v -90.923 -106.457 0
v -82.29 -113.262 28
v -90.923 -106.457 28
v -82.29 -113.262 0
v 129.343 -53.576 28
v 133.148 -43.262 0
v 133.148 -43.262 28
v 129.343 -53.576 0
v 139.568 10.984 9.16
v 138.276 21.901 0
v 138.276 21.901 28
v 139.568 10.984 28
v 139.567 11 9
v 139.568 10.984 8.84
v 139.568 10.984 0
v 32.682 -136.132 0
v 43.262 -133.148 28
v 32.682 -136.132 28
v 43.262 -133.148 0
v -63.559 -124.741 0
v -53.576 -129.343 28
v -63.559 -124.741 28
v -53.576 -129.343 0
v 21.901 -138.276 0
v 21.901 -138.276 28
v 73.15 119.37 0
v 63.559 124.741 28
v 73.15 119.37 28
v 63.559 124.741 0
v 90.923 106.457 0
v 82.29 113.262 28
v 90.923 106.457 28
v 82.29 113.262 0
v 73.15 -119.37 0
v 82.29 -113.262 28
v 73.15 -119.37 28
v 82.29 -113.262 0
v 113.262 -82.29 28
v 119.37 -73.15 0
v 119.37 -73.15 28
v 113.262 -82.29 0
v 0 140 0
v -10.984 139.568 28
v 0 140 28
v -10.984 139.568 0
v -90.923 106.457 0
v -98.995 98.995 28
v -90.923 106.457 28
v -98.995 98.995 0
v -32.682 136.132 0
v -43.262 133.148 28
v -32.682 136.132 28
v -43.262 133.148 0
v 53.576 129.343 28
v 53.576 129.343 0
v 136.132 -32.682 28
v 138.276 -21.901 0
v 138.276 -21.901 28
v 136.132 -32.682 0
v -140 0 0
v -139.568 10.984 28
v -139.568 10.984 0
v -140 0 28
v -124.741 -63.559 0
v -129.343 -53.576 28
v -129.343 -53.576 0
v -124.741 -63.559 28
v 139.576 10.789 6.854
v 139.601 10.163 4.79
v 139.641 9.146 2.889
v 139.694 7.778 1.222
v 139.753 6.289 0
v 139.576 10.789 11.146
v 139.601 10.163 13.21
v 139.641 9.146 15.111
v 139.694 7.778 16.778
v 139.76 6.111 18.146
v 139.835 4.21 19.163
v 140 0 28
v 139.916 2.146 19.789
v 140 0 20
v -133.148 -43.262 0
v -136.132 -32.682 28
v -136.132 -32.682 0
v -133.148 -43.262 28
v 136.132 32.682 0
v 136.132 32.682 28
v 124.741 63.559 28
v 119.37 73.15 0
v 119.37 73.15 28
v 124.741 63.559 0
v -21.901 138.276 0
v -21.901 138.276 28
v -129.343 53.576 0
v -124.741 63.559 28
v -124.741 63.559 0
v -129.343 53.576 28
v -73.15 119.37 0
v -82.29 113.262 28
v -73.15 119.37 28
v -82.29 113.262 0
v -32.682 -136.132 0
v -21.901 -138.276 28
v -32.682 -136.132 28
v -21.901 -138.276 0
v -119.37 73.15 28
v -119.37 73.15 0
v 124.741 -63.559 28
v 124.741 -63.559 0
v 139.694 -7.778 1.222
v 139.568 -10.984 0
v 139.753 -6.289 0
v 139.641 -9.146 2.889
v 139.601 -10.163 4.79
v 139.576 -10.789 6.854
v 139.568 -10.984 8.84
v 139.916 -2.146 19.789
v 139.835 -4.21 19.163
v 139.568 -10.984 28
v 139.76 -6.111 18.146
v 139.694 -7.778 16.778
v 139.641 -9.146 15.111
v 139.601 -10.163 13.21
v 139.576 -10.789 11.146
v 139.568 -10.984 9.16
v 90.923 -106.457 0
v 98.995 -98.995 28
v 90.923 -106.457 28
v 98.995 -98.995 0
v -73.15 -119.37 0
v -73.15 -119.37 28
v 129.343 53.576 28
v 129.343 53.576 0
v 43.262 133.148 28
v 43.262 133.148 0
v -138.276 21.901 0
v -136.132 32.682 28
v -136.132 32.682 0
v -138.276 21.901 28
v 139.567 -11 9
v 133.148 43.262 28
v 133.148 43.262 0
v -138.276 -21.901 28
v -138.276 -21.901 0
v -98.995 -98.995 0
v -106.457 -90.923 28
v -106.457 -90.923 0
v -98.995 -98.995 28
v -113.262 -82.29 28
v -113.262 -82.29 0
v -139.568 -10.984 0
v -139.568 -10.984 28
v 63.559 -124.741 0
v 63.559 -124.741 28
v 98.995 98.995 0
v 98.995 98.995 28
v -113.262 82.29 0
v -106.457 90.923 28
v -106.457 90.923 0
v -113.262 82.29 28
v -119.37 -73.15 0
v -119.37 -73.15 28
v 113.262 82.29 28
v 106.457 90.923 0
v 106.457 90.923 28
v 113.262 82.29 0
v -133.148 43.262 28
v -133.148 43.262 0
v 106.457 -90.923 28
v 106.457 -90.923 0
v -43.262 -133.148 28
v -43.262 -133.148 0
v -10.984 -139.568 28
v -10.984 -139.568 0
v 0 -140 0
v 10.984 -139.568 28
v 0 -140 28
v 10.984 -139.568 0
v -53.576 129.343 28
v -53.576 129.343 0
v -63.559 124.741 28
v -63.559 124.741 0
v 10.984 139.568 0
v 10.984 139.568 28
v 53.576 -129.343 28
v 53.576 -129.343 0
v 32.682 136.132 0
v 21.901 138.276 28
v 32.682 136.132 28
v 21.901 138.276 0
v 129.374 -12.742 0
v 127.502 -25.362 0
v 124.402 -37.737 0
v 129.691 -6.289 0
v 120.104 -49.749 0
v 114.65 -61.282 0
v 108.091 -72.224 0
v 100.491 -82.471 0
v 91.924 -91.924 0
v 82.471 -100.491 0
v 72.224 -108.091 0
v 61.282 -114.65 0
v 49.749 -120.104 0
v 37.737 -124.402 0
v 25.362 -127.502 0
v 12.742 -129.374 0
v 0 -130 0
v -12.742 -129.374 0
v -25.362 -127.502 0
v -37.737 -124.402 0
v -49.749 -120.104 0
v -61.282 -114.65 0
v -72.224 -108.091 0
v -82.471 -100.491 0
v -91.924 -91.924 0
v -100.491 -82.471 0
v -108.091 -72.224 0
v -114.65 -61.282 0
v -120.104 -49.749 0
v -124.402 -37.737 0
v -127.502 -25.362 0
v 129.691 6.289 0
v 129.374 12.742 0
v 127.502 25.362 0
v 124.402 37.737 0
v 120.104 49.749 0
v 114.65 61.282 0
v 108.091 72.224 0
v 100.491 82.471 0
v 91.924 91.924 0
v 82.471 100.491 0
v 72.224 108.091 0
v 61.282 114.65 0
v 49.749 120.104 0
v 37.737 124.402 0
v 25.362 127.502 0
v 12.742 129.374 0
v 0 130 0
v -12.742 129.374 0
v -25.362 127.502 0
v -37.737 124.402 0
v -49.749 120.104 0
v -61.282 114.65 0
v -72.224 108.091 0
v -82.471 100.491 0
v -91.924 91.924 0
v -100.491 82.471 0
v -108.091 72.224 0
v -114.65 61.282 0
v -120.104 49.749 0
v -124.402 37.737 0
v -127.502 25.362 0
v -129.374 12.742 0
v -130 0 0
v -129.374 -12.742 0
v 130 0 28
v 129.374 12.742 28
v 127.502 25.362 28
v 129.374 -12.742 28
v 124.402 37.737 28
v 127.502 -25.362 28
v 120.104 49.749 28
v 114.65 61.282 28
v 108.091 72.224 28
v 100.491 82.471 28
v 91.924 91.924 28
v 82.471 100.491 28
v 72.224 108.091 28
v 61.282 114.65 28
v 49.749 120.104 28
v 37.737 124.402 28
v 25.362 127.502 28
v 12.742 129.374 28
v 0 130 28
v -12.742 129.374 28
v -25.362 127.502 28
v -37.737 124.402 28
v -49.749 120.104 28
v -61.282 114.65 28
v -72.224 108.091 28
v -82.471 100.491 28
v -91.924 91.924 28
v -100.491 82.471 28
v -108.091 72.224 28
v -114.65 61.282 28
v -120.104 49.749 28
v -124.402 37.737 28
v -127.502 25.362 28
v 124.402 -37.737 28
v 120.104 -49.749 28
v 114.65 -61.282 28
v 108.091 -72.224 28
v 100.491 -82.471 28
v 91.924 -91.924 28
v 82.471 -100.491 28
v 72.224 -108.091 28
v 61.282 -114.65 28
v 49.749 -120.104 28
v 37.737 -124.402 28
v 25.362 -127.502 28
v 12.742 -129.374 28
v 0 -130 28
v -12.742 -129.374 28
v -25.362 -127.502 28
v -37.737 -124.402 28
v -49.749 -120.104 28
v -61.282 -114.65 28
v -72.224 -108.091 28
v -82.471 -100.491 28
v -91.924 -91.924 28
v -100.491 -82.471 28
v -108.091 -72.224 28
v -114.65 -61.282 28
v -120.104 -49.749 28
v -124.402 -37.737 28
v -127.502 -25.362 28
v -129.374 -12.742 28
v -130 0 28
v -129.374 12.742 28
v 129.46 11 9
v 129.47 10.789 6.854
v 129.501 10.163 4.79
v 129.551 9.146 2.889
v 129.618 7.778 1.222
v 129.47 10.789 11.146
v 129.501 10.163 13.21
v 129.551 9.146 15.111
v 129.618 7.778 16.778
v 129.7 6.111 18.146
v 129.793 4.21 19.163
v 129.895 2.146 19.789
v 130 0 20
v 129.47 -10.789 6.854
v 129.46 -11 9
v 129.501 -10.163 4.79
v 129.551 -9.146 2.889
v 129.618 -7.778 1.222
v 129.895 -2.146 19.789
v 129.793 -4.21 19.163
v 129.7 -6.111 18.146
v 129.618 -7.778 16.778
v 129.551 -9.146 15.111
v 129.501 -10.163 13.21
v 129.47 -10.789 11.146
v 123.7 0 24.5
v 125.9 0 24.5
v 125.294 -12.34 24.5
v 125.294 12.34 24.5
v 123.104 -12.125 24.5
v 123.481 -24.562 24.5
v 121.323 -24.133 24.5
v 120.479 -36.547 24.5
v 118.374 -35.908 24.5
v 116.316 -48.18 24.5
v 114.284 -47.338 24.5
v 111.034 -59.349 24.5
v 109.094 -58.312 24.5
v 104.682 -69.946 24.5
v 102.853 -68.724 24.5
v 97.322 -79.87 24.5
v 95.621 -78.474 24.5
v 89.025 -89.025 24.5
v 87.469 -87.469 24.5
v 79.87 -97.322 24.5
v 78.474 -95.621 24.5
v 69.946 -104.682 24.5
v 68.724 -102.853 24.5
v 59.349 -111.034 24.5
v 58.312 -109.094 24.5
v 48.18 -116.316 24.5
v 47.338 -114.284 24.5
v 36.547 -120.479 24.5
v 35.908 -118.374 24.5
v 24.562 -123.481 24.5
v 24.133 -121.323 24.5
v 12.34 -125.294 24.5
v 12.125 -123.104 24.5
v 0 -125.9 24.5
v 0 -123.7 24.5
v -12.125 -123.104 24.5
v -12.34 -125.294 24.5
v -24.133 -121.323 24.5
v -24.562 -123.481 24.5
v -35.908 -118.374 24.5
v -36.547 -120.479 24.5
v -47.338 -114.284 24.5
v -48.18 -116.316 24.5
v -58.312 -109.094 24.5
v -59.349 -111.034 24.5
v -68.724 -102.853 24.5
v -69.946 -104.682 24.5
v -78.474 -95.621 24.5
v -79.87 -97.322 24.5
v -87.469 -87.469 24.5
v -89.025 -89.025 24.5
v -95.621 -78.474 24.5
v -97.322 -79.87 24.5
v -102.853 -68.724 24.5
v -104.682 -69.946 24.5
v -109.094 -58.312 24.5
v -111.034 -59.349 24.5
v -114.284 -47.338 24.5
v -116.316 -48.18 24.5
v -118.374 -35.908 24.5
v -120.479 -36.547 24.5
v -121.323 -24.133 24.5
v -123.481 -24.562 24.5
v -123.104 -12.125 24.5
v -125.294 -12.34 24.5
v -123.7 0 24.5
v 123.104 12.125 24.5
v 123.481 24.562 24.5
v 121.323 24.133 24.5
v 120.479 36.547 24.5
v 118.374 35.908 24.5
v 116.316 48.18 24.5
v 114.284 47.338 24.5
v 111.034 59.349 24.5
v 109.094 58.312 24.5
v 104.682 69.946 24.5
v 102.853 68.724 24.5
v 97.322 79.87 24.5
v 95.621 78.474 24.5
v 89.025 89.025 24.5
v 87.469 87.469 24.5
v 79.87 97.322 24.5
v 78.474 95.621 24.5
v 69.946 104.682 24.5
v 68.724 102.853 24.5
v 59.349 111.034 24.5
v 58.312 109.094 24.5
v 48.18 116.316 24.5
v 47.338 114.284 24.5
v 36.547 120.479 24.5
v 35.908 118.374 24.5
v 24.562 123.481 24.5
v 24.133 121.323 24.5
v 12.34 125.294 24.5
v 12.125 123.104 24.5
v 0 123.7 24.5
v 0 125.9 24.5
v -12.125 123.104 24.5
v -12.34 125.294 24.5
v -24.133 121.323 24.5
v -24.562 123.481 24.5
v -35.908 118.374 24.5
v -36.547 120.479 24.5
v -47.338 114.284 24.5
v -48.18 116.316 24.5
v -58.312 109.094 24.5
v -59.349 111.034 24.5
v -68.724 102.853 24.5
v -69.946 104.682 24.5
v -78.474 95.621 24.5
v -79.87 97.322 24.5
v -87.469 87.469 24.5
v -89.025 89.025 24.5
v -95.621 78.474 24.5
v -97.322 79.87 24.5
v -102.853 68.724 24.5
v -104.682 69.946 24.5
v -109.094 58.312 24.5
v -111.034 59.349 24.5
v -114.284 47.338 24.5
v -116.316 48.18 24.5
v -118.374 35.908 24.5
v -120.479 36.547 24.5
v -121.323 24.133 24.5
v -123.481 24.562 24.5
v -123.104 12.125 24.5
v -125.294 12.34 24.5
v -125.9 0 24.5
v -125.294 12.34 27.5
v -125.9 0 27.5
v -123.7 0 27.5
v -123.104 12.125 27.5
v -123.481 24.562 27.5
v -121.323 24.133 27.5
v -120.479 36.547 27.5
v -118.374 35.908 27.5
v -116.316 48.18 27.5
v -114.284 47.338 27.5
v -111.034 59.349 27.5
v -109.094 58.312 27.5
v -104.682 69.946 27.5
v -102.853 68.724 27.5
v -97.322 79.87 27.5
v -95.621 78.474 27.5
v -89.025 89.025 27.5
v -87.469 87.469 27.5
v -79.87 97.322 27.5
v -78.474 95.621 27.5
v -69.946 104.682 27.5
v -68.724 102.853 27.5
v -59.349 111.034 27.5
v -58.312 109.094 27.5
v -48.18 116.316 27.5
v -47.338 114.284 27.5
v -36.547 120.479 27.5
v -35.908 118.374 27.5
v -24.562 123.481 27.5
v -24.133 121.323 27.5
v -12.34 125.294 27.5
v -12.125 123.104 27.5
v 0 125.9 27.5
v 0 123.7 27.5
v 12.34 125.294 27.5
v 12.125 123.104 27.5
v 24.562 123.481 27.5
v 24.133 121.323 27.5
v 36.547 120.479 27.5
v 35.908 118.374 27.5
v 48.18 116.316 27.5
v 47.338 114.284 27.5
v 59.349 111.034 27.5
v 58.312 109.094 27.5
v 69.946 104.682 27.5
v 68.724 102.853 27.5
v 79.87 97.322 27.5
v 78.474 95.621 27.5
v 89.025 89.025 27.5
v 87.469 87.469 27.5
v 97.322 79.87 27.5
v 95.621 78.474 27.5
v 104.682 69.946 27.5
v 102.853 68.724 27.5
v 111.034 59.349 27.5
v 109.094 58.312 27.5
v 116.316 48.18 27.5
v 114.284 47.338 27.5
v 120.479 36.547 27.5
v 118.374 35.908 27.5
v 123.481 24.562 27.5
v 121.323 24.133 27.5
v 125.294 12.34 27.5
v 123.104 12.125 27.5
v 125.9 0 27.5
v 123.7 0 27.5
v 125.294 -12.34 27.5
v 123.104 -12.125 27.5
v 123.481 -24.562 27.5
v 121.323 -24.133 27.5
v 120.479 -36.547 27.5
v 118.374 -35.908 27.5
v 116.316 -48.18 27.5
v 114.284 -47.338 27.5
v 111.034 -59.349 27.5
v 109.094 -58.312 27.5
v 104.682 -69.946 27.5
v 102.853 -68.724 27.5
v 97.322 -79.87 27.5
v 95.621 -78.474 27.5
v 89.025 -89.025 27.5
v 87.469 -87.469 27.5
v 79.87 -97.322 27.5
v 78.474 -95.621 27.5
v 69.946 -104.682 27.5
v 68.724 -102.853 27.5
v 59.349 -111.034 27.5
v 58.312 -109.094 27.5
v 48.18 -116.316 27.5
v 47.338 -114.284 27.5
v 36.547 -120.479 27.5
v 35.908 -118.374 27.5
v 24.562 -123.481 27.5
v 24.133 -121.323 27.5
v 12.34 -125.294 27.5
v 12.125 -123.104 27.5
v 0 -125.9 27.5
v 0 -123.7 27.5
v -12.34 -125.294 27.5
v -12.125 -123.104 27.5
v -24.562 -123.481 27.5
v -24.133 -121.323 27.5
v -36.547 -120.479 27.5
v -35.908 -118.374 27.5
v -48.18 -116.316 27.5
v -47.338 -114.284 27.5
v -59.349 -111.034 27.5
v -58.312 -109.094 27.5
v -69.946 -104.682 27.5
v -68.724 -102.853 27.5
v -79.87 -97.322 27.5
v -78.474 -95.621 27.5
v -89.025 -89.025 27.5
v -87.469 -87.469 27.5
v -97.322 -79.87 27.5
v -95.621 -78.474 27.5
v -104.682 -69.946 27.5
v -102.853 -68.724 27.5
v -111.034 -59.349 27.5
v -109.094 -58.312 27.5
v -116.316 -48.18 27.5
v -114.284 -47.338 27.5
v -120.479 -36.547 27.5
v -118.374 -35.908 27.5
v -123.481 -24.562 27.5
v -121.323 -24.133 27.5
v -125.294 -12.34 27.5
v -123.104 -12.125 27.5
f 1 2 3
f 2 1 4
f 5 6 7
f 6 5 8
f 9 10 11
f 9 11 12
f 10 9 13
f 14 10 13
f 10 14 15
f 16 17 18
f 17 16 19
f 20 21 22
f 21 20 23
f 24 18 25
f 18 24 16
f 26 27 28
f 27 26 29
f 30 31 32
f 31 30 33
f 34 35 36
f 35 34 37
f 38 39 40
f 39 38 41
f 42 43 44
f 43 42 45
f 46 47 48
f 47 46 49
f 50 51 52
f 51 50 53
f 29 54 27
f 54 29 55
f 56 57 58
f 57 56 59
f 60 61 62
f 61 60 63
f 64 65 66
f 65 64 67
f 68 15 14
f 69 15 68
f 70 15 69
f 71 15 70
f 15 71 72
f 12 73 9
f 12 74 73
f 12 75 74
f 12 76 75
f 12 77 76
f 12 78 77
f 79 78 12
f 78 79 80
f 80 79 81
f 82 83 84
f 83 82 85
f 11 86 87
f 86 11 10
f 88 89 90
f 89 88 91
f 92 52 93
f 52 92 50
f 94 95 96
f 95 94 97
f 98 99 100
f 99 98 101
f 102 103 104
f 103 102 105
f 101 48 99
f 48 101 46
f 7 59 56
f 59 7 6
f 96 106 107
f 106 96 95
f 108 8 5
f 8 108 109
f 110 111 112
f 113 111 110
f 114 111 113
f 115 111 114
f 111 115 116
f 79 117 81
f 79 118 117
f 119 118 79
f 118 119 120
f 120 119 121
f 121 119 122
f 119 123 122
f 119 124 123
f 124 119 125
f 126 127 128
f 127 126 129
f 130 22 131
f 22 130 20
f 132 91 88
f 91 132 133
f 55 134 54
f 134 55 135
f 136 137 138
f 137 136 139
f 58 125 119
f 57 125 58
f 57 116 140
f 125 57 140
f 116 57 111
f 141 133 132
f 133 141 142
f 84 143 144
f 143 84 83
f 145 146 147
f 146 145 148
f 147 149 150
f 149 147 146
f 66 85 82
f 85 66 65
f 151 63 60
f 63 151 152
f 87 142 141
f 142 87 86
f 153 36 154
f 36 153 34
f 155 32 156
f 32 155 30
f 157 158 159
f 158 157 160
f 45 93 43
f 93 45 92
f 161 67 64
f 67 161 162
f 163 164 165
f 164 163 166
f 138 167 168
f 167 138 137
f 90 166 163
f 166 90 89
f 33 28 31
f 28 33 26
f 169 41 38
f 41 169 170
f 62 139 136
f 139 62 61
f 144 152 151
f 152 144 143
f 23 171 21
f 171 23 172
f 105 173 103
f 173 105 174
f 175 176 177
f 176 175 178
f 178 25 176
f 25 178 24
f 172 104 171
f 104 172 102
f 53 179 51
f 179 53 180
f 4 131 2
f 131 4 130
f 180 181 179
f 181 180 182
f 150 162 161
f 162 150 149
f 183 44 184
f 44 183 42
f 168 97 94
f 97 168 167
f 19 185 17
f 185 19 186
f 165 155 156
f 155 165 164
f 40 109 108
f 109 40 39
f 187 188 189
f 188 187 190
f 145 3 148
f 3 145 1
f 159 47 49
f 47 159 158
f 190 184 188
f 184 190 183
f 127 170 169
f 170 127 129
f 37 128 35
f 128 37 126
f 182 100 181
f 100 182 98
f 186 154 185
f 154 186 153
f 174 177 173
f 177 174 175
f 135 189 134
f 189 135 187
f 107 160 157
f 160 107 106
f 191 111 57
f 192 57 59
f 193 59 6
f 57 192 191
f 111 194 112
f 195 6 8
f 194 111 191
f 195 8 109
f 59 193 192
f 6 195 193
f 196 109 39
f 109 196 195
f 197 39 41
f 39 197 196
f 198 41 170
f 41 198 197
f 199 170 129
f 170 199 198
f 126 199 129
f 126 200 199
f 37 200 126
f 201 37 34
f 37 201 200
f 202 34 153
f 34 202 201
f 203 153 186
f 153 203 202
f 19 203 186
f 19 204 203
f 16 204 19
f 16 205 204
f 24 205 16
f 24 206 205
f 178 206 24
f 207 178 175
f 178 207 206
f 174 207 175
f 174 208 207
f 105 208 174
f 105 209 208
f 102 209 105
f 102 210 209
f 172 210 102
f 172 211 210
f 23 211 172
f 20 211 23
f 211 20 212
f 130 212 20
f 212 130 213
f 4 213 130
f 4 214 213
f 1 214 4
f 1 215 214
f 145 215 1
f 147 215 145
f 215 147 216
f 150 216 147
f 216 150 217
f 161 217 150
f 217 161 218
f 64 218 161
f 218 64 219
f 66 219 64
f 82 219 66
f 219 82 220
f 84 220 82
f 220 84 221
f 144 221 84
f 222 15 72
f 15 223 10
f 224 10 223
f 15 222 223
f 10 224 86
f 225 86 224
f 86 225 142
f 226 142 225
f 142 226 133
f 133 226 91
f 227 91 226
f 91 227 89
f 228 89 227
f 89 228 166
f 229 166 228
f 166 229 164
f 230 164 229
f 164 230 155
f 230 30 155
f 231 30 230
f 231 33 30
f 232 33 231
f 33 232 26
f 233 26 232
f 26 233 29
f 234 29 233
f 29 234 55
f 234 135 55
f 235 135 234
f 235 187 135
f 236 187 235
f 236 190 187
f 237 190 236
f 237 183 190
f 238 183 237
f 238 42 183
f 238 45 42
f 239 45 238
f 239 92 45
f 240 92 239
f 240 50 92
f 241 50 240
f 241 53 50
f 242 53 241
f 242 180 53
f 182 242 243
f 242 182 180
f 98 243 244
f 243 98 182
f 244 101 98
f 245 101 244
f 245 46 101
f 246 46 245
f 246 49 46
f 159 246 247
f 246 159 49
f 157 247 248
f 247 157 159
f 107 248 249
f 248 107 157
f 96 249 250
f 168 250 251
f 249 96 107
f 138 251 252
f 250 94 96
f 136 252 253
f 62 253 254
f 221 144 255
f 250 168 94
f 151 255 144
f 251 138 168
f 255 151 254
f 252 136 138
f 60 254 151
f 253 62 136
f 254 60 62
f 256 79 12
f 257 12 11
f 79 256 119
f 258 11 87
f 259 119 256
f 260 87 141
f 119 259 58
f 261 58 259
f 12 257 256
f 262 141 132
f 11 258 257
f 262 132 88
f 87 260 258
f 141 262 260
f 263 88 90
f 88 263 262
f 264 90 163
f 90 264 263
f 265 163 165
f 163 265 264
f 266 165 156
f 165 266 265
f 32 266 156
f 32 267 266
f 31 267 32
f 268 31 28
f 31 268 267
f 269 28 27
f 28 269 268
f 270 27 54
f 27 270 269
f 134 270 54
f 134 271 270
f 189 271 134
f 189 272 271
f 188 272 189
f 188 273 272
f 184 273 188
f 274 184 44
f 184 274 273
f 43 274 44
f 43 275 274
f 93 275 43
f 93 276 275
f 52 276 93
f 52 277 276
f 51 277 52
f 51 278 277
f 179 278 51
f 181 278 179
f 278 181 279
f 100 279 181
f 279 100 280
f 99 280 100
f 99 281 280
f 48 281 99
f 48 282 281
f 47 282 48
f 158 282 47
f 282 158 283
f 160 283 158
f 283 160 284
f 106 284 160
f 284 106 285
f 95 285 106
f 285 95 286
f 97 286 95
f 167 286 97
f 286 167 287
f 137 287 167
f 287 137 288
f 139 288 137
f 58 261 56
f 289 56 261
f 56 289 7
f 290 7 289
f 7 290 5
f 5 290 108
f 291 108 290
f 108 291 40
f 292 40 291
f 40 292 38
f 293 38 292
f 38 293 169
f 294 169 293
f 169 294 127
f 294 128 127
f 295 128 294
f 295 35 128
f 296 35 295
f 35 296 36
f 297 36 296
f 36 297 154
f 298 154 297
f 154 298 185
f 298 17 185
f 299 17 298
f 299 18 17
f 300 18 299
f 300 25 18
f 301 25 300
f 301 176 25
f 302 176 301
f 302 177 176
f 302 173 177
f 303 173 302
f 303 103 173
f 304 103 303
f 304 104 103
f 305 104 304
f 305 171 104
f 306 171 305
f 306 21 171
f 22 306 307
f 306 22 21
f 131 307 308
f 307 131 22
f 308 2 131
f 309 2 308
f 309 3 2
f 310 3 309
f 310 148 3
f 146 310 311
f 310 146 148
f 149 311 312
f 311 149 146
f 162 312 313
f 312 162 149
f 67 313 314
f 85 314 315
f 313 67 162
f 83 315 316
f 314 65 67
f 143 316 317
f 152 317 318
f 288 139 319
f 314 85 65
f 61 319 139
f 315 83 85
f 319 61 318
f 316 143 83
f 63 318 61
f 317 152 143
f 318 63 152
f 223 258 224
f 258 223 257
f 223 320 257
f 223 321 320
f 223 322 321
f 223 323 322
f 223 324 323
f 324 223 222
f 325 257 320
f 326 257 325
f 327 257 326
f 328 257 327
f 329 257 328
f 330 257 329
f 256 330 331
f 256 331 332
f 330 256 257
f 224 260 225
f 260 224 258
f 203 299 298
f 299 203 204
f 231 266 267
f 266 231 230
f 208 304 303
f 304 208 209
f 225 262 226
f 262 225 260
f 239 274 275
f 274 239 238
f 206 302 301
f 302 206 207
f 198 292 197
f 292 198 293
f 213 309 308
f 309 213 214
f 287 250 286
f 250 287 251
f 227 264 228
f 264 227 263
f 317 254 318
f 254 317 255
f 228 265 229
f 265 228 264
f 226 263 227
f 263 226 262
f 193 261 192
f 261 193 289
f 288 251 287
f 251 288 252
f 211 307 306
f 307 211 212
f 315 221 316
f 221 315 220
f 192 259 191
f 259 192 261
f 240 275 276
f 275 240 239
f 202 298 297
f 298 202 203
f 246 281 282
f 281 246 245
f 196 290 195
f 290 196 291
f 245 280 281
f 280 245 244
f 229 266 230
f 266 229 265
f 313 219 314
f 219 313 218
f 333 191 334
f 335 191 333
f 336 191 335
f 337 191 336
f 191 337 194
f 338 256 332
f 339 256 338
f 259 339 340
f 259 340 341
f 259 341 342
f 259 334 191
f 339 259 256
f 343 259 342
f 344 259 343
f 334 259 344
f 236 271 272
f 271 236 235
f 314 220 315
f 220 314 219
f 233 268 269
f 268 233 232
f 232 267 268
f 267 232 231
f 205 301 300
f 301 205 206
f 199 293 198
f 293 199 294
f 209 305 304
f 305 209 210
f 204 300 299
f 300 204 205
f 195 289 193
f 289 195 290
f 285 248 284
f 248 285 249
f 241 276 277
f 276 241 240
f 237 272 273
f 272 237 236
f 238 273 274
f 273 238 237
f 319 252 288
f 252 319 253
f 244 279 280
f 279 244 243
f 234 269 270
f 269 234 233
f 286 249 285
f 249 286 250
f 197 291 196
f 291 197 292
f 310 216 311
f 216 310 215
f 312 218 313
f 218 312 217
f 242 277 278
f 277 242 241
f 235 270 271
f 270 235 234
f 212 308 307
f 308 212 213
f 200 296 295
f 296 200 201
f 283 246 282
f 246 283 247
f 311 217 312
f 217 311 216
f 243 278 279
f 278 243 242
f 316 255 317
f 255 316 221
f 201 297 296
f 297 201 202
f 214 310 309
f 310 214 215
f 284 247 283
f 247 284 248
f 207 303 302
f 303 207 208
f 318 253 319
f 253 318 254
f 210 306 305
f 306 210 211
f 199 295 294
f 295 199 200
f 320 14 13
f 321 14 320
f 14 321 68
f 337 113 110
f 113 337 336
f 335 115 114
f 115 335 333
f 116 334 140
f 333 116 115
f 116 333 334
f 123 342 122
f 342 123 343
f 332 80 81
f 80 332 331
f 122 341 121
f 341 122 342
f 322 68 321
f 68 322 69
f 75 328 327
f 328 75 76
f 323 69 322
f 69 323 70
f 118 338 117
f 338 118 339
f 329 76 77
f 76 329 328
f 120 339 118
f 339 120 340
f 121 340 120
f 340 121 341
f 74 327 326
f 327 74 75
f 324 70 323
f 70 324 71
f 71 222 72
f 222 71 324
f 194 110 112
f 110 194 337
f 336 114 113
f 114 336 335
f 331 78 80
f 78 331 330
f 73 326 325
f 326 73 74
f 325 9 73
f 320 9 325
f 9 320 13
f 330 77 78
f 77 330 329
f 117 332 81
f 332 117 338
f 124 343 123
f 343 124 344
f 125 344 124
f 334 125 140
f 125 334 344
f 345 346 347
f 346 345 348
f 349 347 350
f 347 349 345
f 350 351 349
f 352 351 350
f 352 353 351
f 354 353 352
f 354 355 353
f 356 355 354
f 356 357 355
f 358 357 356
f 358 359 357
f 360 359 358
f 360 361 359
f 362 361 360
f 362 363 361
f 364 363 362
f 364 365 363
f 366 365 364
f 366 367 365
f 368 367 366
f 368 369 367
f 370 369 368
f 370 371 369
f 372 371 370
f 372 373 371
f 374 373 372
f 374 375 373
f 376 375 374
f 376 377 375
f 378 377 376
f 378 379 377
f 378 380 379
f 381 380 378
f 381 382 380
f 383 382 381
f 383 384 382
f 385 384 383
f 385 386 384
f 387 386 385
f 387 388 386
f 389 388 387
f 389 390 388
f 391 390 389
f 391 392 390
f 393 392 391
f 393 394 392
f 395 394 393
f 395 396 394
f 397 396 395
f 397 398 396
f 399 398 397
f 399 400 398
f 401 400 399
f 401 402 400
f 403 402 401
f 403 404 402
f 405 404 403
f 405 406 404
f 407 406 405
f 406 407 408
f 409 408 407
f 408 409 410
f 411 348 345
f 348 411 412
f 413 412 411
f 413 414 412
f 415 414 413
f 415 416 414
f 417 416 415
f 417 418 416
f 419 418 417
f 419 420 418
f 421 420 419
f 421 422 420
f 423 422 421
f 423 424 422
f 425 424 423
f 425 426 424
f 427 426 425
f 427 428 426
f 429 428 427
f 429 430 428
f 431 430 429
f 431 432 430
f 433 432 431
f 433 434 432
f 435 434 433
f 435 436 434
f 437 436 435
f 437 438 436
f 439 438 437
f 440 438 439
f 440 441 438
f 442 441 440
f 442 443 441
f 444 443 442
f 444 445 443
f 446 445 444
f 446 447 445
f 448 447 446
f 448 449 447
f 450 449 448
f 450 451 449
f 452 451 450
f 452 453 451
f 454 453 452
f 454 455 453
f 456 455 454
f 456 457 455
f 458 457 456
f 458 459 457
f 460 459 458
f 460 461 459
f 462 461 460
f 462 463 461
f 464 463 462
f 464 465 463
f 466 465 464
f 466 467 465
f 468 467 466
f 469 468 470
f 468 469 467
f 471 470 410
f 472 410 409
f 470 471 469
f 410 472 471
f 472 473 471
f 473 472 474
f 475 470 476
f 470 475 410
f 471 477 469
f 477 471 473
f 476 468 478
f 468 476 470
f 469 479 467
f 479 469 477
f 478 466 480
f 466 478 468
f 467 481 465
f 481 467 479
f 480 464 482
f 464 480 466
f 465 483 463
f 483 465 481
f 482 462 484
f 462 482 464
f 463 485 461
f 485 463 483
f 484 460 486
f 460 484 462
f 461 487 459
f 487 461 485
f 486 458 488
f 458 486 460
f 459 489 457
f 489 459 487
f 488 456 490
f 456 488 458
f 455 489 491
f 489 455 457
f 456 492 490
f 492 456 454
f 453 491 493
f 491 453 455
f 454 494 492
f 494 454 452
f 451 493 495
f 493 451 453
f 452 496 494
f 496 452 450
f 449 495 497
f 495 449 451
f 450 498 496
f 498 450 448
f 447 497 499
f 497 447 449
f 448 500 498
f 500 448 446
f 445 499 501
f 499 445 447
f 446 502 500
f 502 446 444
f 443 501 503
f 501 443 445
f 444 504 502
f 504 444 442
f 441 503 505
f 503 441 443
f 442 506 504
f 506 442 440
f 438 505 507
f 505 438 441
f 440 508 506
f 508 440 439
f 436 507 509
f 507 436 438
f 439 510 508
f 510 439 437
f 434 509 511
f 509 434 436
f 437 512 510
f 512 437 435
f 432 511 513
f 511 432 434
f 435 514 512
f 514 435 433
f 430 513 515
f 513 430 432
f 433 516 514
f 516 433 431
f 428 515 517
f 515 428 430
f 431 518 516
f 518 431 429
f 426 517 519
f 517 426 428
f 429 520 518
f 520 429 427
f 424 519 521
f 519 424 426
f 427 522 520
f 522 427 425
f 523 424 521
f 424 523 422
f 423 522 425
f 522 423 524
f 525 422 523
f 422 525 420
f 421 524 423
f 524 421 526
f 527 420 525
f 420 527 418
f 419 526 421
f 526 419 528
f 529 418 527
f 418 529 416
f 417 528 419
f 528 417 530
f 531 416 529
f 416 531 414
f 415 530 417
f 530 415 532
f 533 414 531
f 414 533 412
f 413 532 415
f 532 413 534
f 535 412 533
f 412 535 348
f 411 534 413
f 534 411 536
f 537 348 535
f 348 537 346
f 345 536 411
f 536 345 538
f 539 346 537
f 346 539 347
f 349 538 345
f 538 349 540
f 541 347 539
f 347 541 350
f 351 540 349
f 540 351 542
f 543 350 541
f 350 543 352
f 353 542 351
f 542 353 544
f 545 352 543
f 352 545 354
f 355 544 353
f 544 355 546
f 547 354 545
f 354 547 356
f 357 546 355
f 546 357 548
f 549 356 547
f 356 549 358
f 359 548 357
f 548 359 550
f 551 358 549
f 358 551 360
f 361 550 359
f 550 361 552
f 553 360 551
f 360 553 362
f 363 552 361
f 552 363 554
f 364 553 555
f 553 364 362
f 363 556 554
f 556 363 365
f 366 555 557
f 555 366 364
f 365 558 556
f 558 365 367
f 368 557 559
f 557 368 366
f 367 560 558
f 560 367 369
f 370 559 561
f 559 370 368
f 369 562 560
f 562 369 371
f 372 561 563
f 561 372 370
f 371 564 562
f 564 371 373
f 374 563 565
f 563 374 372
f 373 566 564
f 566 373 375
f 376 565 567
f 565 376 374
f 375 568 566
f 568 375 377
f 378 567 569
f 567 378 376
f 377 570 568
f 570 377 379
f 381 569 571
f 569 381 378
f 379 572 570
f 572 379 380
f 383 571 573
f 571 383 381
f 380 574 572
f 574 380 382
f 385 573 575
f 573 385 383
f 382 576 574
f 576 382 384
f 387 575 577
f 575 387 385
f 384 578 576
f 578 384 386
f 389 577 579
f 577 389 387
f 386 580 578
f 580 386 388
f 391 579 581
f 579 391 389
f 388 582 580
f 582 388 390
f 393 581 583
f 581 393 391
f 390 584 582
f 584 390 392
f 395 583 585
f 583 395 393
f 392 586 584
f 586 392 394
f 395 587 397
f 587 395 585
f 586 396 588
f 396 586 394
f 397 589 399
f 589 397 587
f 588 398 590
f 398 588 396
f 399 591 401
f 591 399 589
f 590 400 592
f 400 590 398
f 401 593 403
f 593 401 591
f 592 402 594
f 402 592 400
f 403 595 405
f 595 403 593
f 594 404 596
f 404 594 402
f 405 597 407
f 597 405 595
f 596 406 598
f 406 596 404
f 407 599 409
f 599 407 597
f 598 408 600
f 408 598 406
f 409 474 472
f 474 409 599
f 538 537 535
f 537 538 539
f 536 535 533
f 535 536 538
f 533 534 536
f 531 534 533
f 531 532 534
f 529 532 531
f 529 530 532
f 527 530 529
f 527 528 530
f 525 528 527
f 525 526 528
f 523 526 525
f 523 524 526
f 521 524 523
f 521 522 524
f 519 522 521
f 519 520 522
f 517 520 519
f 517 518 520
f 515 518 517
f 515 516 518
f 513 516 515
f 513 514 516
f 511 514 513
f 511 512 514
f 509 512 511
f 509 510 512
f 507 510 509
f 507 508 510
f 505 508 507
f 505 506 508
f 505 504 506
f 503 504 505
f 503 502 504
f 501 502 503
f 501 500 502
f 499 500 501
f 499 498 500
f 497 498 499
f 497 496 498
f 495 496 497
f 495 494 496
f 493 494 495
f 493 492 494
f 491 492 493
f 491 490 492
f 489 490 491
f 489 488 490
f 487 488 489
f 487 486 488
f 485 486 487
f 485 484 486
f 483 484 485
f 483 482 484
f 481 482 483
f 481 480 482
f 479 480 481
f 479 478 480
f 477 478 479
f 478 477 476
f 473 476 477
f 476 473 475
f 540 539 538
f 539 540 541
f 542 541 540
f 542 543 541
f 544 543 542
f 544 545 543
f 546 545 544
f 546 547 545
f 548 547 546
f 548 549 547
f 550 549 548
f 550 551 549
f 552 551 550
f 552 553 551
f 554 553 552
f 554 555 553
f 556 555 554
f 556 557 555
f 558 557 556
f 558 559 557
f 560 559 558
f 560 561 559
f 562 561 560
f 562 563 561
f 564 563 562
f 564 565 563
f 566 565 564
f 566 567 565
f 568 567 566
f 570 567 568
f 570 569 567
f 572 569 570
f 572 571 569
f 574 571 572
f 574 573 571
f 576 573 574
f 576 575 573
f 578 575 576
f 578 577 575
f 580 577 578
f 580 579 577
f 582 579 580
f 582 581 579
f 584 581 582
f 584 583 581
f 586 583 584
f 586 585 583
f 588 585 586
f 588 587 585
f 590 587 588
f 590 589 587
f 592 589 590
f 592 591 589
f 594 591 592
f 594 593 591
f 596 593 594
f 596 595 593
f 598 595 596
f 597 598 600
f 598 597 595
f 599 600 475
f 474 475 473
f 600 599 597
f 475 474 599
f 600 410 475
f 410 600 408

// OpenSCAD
// file: lib/utils.scad
// Shared utilities for CHORUS-SGH-1 OpenSCAD

module flanged_port(od=16, length=25, flange_od=40, flange_t=6) {
    translate([0, 0, -length])
        cylinder(h=length, d=od, $fn=32);
    cylinder(h=flange_t, d=flange_od, $fn=48);
}

module o_ring_groove(dia, depth=2.2, width=3.0) {
    rotate_extrude($fn=64)
        translate([dia/2 - depth, 0])
            square([depth, width], center=true);
}

module bolt_hole(d=6.6, h=50) {
    cylinder(h=h, d=d, $fn=24);
}

module bolt_circle_pattern(n, radius, d=6.6, h=50) {
    for (i = [0:n-1]) {
        ang = 360 * i / n;
        rotate([0, 0, ang])
            translate([radius, 0, 0])
                bolt_hole(d=d, h=h);
    }
}

module plate_frame(w, h, t, corner_r=8) {
    linear_extrude(t)
        offset(r=corner_r)
            square([w - 2*corner_r, h - 2*corner_r], center=true);
}
// file: lib/generated_constants.scad
// AUTO-GENERATED from simulation/sizing.py — do not hand edit
P_target_W = 10.0;
A_mem_m2 = 0.72;
active_w = 200.0;
active_h = 300.0;
n_plates = 12;
housing_od = 280.0;
housing_len = 264;
bolt_circle = 240.0;
frame_L = 664;
frame_W = 480.0;
frame_H = 900;
delta_P_bar = 34.58;
plate_pitch = 12;
// main file
// CHORUS-SGH-1 — housing end cap (feed or draw — mirror in assembly)
include <lib/generated_constants.scad>
include <lib/utils.scad>

wall = 10;
cap_t = 18;

module end_cap(side="feed") {
    difference() {
        union() {
            cylinder(h=cap_t, d=housing_od, $fn=80);
            translate([0, 0, cap_t])
                cylinder(h=wall, d=housing_od, $fn=80);
        }
        // bore for stack
        translate([0, 0, -1])
            cylinder(h=cap_t+wall+2, d=housing_od - 2*wall, $fn=64);
        bolt_circle_pattern(8, bolt_circle/2, d=6.6, h=cap_t+wall+10);
        // port
        if (side == "feed")
            translate([housing_od/2 - wall - 5, 0, cap_t/2])
                rotate([0, 90, 0])
                    cylinder(h=wall+15, d=22, $fn=32);
        else
            translate([-housing_od/2 + wall + 5, 0, cap_t/2])
                rotate([0, -90, 0])
                    cylinder(h=wall+15, d=22, $fn=32);
    }
    // O-ring groove on face
    translate([0, 0, cap_t+wall-2])
        o_ring_groove(housing_od - 2*wall - 6);
}

end_cap("feed");
